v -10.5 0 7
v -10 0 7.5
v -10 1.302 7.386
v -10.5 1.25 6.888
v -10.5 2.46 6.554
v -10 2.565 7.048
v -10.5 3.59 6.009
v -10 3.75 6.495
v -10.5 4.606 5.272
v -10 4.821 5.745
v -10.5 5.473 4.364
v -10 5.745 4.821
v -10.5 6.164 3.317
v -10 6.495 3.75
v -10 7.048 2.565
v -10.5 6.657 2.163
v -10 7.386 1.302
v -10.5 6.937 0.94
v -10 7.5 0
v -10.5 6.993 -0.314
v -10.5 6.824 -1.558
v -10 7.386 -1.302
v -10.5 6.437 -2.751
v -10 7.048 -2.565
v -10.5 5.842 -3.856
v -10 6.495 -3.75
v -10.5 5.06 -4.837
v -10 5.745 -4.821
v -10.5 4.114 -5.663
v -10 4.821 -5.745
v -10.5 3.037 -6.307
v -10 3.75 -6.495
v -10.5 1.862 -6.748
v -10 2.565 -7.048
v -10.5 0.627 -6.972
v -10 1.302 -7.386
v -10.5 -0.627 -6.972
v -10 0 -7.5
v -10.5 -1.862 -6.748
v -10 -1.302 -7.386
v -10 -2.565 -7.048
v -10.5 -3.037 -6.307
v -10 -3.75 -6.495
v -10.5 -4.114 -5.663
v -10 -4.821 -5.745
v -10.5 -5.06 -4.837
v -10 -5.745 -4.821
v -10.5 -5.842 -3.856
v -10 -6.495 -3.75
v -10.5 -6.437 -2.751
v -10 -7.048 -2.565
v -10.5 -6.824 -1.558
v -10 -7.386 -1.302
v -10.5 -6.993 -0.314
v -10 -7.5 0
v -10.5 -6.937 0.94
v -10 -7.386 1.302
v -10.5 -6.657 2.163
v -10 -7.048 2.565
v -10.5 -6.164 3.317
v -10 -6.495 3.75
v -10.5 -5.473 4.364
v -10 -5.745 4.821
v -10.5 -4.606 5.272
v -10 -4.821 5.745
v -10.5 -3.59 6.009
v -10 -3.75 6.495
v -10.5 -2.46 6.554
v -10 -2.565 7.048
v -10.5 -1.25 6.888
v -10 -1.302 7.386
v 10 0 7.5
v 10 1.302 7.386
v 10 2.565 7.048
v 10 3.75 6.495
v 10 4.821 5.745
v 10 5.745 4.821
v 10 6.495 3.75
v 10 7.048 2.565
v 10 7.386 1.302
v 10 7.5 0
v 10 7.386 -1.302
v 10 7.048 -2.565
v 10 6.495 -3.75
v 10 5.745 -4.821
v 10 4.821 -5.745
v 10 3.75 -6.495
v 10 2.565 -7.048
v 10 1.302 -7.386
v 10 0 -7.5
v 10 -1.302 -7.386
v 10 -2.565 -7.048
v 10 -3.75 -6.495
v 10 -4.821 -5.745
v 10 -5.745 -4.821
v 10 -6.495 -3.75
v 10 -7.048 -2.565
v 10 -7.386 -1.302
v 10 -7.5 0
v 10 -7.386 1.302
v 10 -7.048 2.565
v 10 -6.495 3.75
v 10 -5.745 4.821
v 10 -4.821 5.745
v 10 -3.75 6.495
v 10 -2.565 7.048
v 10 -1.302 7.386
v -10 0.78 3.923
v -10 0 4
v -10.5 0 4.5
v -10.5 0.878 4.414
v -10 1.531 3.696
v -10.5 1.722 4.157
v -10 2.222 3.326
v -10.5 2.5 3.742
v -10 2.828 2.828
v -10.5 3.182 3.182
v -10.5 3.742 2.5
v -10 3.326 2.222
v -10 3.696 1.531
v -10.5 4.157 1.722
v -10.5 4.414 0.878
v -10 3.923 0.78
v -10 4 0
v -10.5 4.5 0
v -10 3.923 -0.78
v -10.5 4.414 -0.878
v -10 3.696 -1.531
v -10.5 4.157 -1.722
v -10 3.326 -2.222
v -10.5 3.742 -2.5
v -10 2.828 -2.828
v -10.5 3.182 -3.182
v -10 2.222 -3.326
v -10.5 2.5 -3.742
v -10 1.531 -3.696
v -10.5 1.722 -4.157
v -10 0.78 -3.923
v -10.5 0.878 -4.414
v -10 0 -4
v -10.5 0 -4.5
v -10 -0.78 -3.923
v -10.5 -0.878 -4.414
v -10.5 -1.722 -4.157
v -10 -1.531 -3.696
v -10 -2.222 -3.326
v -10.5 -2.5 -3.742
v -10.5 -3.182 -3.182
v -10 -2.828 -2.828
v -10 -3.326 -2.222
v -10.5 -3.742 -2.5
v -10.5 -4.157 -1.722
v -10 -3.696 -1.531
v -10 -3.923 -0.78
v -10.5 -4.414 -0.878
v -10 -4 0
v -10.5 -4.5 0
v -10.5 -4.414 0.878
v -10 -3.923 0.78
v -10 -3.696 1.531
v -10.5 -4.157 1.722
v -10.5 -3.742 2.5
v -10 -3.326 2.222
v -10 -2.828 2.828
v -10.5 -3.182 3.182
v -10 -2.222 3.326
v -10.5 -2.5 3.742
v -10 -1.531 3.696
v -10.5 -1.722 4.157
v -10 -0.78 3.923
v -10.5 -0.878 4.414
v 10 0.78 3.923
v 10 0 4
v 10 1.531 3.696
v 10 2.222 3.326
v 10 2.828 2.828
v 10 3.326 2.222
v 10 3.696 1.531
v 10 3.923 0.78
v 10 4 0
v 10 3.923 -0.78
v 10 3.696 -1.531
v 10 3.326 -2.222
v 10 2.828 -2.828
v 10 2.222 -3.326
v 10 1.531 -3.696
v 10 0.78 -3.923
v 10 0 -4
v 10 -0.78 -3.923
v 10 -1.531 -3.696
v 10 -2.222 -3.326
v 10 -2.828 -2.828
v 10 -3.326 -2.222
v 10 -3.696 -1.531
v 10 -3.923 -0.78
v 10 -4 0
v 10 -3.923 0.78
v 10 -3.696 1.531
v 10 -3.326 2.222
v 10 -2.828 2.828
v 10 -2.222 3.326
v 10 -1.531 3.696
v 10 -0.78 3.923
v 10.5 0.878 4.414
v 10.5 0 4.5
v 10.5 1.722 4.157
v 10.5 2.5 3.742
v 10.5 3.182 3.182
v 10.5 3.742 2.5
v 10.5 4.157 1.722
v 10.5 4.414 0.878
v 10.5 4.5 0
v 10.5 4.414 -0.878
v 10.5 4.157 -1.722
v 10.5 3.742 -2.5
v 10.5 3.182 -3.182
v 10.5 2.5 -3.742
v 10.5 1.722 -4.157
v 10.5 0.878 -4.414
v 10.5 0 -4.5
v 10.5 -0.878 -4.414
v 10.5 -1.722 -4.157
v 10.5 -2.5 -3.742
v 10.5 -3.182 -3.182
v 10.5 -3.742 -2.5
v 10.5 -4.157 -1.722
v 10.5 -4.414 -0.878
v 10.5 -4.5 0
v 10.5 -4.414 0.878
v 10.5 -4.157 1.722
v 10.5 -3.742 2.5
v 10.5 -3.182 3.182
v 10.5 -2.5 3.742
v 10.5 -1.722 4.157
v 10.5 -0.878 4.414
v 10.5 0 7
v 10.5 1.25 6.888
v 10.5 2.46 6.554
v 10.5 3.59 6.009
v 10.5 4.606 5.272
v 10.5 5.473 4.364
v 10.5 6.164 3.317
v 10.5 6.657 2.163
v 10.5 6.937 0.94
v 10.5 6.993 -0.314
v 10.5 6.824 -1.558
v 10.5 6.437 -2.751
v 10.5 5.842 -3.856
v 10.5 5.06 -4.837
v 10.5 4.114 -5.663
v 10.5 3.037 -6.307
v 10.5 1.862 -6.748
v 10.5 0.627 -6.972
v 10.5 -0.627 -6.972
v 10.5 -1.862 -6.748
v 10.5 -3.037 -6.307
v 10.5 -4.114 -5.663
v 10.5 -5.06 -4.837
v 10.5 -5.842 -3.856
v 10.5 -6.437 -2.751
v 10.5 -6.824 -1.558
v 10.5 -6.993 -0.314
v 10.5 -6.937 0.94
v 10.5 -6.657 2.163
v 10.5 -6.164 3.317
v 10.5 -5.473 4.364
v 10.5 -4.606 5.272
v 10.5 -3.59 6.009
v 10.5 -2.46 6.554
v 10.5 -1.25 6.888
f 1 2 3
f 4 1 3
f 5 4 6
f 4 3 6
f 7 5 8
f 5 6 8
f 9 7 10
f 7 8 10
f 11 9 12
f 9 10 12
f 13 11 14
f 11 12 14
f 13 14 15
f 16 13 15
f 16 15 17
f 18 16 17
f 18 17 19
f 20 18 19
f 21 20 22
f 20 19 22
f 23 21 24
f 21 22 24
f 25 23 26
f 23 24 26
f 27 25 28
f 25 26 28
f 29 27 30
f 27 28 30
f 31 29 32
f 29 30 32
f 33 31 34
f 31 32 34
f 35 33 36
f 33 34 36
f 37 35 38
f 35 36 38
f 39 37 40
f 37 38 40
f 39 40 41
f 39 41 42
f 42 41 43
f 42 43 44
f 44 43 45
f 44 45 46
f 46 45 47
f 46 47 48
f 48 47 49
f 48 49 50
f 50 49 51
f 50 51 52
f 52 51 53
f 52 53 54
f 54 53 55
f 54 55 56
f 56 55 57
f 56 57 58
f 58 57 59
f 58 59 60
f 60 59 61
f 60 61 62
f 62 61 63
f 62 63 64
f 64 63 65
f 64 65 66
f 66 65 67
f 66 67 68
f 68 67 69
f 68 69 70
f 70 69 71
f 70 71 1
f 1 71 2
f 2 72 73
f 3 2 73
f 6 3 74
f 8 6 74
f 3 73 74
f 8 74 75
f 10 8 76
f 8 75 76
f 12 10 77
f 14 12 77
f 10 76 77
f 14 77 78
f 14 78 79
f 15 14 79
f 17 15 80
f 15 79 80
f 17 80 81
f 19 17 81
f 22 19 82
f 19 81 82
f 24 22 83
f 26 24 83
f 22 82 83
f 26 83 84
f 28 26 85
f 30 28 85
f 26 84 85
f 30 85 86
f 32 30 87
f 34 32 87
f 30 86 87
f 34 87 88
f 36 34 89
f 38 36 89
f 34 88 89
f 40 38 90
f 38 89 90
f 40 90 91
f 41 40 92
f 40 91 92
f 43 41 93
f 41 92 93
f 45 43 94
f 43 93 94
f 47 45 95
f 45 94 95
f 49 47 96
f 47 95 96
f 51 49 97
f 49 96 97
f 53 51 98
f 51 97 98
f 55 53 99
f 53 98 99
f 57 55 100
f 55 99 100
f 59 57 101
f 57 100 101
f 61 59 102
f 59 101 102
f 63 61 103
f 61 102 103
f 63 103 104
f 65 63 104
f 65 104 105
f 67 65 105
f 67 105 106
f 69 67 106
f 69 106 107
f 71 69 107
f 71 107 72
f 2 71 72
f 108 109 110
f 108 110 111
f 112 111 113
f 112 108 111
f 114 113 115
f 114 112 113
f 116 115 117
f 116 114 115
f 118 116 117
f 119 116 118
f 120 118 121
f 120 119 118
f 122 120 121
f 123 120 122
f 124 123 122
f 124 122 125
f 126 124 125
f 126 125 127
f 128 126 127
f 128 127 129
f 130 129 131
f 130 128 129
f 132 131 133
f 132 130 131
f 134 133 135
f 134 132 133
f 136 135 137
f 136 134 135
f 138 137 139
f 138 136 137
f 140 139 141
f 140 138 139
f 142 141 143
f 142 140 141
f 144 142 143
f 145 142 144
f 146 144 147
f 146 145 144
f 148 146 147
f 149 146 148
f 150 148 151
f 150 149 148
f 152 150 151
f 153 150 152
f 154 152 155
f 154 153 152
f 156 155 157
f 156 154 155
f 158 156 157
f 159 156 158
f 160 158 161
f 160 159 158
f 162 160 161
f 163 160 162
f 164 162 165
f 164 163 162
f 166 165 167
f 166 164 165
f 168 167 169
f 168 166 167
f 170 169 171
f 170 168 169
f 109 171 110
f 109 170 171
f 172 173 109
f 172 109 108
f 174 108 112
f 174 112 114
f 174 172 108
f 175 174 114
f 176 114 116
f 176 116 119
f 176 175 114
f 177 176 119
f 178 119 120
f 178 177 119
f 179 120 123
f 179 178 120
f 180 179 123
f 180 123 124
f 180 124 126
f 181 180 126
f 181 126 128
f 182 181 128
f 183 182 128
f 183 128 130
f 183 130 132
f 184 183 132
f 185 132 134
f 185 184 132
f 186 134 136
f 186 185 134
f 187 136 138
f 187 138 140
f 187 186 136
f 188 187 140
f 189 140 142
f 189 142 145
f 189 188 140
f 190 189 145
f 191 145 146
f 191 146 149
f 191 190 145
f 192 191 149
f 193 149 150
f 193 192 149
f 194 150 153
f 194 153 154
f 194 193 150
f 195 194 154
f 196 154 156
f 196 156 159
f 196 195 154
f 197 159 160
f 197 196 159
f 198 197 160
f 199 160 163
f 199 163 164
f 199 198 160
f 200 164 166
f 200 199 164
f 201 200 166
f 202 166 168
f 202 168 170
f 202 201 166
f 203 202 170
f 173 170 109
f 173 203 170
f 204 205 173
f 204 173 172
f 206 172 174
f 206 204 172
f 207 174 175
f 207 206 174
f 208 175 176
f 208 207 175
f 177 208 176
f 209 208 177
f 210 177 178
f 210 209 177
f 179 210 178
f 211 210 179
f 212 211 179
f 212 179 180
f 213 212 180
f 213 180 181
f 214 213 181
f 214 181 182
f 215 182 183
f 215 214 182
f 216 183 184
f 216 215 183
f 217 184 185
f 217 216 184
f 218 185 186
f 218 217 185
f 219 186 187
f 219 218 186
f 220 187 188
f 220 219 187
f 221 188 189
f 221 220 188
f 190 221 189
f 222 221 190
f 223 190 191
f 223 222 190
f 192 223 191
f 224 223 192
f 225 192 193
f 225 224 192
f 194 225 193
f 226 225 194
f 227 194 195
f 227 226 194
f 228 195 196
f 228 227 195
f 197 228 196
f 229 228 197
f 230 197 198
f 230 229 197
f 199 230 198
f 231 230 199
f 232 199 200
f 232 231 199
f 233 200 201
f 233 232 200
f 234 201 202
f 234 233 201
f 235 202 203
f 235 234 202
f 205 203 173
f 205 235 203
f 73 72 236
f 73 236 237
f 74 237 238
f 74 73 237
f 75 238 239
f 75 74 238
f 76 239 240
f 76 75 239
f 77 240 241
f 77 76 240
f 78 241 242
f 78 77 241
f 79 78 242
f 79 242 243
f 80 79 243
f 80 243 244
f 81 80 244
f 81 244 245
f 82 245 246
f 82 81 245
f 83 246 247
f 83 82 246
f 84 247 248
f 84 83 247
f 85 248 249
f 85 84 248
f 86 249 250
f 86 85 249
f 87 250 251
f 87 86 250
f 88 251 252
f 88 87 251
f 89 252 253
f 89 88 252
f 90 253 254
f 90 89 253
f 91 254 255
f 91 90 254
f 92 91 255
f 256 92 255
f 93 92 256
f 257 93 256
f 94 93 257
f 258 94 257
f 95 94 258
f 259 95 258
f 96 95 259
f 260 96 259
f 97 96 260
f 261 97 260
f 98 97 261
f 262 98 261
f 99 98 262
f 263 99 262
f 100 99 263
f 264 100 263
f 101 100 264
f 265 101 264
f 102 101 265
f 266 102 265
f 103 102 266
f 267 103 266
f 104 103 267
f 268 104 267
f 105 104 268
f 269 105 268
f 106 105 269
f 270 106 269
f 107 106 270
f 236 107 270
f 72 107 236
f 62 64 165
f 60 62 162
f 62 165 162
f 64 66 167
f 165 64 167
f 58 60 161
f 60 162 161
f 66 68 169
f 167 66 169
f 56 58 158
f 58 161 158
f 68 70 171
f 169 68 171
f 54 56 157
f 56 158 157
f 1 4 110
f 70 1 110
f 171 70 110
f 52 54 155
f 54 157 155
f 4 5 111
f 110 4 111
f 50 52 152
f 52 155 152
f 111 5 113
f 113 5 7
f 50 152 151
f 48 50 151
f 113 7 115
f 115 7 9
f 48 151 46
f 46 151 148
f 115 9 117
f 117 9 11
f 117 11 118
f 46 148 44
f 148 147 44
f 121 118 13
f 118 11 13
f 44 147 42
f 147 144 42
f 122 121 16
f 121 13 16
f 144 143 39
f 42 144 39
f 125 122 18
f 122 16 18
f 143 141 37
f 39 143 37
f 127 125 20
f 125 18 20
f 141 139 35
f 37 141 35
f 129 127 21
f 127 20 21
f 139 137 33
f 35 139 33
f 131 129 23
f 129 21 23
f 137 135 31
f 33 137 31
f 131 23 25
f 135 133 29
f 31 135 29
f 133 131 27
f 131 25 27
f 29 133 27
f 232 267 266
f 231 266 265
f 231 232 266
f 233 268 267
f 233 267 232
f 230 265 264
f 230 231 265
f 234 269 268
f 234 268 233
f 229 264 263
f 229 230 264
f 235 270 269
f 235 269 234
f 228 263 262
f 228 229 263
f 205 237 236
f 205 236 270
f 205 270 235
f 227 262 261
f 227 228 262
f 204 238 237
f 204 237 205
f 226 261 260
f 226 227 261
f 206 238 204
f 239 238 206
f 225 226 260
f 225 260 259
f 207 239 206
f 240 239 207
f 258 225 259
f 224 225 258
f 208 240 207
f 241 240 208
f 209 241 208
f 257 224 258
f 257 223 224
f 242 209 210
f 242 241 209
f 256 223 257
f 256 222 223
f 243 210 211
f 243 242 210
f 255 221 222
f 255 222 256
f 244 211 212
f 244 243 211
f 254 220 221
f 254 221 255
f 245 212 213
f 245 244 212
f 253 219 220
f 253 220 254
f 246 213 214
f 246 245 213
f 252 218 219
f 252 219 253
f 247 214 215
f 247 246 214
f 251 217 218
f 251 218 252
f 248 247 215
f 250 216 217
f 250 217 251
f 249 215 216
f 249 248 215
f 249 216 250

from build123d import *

# Parameters (mm, degrees)
F0_W    = 21
F0_H    = 3.5
F2_SIZE = 0.5


with BuildPart() as f1:
    # F0 (on Front) → F1 (revolve)
    with BuildSketch(Plane.XZ):
        with Locations((0, 5.75)):
            Rectangle(F0_W, F0_H)
    revolve(axis=Axis((-0.426252, 0, 0), (-1, 0, 0)))

    # F2
    f2_edges = [f1.edges().sort_by_distance(p)[0] for p in [
        (10.5, 0, -7.5),
        (10.5, 0, -4),
        (-10.5, 0, -4),
        (-10.5, 0, -7.5),
    ]]
    chamfer(f2_edges, length=F2_SIZE)


solid = f1.part
